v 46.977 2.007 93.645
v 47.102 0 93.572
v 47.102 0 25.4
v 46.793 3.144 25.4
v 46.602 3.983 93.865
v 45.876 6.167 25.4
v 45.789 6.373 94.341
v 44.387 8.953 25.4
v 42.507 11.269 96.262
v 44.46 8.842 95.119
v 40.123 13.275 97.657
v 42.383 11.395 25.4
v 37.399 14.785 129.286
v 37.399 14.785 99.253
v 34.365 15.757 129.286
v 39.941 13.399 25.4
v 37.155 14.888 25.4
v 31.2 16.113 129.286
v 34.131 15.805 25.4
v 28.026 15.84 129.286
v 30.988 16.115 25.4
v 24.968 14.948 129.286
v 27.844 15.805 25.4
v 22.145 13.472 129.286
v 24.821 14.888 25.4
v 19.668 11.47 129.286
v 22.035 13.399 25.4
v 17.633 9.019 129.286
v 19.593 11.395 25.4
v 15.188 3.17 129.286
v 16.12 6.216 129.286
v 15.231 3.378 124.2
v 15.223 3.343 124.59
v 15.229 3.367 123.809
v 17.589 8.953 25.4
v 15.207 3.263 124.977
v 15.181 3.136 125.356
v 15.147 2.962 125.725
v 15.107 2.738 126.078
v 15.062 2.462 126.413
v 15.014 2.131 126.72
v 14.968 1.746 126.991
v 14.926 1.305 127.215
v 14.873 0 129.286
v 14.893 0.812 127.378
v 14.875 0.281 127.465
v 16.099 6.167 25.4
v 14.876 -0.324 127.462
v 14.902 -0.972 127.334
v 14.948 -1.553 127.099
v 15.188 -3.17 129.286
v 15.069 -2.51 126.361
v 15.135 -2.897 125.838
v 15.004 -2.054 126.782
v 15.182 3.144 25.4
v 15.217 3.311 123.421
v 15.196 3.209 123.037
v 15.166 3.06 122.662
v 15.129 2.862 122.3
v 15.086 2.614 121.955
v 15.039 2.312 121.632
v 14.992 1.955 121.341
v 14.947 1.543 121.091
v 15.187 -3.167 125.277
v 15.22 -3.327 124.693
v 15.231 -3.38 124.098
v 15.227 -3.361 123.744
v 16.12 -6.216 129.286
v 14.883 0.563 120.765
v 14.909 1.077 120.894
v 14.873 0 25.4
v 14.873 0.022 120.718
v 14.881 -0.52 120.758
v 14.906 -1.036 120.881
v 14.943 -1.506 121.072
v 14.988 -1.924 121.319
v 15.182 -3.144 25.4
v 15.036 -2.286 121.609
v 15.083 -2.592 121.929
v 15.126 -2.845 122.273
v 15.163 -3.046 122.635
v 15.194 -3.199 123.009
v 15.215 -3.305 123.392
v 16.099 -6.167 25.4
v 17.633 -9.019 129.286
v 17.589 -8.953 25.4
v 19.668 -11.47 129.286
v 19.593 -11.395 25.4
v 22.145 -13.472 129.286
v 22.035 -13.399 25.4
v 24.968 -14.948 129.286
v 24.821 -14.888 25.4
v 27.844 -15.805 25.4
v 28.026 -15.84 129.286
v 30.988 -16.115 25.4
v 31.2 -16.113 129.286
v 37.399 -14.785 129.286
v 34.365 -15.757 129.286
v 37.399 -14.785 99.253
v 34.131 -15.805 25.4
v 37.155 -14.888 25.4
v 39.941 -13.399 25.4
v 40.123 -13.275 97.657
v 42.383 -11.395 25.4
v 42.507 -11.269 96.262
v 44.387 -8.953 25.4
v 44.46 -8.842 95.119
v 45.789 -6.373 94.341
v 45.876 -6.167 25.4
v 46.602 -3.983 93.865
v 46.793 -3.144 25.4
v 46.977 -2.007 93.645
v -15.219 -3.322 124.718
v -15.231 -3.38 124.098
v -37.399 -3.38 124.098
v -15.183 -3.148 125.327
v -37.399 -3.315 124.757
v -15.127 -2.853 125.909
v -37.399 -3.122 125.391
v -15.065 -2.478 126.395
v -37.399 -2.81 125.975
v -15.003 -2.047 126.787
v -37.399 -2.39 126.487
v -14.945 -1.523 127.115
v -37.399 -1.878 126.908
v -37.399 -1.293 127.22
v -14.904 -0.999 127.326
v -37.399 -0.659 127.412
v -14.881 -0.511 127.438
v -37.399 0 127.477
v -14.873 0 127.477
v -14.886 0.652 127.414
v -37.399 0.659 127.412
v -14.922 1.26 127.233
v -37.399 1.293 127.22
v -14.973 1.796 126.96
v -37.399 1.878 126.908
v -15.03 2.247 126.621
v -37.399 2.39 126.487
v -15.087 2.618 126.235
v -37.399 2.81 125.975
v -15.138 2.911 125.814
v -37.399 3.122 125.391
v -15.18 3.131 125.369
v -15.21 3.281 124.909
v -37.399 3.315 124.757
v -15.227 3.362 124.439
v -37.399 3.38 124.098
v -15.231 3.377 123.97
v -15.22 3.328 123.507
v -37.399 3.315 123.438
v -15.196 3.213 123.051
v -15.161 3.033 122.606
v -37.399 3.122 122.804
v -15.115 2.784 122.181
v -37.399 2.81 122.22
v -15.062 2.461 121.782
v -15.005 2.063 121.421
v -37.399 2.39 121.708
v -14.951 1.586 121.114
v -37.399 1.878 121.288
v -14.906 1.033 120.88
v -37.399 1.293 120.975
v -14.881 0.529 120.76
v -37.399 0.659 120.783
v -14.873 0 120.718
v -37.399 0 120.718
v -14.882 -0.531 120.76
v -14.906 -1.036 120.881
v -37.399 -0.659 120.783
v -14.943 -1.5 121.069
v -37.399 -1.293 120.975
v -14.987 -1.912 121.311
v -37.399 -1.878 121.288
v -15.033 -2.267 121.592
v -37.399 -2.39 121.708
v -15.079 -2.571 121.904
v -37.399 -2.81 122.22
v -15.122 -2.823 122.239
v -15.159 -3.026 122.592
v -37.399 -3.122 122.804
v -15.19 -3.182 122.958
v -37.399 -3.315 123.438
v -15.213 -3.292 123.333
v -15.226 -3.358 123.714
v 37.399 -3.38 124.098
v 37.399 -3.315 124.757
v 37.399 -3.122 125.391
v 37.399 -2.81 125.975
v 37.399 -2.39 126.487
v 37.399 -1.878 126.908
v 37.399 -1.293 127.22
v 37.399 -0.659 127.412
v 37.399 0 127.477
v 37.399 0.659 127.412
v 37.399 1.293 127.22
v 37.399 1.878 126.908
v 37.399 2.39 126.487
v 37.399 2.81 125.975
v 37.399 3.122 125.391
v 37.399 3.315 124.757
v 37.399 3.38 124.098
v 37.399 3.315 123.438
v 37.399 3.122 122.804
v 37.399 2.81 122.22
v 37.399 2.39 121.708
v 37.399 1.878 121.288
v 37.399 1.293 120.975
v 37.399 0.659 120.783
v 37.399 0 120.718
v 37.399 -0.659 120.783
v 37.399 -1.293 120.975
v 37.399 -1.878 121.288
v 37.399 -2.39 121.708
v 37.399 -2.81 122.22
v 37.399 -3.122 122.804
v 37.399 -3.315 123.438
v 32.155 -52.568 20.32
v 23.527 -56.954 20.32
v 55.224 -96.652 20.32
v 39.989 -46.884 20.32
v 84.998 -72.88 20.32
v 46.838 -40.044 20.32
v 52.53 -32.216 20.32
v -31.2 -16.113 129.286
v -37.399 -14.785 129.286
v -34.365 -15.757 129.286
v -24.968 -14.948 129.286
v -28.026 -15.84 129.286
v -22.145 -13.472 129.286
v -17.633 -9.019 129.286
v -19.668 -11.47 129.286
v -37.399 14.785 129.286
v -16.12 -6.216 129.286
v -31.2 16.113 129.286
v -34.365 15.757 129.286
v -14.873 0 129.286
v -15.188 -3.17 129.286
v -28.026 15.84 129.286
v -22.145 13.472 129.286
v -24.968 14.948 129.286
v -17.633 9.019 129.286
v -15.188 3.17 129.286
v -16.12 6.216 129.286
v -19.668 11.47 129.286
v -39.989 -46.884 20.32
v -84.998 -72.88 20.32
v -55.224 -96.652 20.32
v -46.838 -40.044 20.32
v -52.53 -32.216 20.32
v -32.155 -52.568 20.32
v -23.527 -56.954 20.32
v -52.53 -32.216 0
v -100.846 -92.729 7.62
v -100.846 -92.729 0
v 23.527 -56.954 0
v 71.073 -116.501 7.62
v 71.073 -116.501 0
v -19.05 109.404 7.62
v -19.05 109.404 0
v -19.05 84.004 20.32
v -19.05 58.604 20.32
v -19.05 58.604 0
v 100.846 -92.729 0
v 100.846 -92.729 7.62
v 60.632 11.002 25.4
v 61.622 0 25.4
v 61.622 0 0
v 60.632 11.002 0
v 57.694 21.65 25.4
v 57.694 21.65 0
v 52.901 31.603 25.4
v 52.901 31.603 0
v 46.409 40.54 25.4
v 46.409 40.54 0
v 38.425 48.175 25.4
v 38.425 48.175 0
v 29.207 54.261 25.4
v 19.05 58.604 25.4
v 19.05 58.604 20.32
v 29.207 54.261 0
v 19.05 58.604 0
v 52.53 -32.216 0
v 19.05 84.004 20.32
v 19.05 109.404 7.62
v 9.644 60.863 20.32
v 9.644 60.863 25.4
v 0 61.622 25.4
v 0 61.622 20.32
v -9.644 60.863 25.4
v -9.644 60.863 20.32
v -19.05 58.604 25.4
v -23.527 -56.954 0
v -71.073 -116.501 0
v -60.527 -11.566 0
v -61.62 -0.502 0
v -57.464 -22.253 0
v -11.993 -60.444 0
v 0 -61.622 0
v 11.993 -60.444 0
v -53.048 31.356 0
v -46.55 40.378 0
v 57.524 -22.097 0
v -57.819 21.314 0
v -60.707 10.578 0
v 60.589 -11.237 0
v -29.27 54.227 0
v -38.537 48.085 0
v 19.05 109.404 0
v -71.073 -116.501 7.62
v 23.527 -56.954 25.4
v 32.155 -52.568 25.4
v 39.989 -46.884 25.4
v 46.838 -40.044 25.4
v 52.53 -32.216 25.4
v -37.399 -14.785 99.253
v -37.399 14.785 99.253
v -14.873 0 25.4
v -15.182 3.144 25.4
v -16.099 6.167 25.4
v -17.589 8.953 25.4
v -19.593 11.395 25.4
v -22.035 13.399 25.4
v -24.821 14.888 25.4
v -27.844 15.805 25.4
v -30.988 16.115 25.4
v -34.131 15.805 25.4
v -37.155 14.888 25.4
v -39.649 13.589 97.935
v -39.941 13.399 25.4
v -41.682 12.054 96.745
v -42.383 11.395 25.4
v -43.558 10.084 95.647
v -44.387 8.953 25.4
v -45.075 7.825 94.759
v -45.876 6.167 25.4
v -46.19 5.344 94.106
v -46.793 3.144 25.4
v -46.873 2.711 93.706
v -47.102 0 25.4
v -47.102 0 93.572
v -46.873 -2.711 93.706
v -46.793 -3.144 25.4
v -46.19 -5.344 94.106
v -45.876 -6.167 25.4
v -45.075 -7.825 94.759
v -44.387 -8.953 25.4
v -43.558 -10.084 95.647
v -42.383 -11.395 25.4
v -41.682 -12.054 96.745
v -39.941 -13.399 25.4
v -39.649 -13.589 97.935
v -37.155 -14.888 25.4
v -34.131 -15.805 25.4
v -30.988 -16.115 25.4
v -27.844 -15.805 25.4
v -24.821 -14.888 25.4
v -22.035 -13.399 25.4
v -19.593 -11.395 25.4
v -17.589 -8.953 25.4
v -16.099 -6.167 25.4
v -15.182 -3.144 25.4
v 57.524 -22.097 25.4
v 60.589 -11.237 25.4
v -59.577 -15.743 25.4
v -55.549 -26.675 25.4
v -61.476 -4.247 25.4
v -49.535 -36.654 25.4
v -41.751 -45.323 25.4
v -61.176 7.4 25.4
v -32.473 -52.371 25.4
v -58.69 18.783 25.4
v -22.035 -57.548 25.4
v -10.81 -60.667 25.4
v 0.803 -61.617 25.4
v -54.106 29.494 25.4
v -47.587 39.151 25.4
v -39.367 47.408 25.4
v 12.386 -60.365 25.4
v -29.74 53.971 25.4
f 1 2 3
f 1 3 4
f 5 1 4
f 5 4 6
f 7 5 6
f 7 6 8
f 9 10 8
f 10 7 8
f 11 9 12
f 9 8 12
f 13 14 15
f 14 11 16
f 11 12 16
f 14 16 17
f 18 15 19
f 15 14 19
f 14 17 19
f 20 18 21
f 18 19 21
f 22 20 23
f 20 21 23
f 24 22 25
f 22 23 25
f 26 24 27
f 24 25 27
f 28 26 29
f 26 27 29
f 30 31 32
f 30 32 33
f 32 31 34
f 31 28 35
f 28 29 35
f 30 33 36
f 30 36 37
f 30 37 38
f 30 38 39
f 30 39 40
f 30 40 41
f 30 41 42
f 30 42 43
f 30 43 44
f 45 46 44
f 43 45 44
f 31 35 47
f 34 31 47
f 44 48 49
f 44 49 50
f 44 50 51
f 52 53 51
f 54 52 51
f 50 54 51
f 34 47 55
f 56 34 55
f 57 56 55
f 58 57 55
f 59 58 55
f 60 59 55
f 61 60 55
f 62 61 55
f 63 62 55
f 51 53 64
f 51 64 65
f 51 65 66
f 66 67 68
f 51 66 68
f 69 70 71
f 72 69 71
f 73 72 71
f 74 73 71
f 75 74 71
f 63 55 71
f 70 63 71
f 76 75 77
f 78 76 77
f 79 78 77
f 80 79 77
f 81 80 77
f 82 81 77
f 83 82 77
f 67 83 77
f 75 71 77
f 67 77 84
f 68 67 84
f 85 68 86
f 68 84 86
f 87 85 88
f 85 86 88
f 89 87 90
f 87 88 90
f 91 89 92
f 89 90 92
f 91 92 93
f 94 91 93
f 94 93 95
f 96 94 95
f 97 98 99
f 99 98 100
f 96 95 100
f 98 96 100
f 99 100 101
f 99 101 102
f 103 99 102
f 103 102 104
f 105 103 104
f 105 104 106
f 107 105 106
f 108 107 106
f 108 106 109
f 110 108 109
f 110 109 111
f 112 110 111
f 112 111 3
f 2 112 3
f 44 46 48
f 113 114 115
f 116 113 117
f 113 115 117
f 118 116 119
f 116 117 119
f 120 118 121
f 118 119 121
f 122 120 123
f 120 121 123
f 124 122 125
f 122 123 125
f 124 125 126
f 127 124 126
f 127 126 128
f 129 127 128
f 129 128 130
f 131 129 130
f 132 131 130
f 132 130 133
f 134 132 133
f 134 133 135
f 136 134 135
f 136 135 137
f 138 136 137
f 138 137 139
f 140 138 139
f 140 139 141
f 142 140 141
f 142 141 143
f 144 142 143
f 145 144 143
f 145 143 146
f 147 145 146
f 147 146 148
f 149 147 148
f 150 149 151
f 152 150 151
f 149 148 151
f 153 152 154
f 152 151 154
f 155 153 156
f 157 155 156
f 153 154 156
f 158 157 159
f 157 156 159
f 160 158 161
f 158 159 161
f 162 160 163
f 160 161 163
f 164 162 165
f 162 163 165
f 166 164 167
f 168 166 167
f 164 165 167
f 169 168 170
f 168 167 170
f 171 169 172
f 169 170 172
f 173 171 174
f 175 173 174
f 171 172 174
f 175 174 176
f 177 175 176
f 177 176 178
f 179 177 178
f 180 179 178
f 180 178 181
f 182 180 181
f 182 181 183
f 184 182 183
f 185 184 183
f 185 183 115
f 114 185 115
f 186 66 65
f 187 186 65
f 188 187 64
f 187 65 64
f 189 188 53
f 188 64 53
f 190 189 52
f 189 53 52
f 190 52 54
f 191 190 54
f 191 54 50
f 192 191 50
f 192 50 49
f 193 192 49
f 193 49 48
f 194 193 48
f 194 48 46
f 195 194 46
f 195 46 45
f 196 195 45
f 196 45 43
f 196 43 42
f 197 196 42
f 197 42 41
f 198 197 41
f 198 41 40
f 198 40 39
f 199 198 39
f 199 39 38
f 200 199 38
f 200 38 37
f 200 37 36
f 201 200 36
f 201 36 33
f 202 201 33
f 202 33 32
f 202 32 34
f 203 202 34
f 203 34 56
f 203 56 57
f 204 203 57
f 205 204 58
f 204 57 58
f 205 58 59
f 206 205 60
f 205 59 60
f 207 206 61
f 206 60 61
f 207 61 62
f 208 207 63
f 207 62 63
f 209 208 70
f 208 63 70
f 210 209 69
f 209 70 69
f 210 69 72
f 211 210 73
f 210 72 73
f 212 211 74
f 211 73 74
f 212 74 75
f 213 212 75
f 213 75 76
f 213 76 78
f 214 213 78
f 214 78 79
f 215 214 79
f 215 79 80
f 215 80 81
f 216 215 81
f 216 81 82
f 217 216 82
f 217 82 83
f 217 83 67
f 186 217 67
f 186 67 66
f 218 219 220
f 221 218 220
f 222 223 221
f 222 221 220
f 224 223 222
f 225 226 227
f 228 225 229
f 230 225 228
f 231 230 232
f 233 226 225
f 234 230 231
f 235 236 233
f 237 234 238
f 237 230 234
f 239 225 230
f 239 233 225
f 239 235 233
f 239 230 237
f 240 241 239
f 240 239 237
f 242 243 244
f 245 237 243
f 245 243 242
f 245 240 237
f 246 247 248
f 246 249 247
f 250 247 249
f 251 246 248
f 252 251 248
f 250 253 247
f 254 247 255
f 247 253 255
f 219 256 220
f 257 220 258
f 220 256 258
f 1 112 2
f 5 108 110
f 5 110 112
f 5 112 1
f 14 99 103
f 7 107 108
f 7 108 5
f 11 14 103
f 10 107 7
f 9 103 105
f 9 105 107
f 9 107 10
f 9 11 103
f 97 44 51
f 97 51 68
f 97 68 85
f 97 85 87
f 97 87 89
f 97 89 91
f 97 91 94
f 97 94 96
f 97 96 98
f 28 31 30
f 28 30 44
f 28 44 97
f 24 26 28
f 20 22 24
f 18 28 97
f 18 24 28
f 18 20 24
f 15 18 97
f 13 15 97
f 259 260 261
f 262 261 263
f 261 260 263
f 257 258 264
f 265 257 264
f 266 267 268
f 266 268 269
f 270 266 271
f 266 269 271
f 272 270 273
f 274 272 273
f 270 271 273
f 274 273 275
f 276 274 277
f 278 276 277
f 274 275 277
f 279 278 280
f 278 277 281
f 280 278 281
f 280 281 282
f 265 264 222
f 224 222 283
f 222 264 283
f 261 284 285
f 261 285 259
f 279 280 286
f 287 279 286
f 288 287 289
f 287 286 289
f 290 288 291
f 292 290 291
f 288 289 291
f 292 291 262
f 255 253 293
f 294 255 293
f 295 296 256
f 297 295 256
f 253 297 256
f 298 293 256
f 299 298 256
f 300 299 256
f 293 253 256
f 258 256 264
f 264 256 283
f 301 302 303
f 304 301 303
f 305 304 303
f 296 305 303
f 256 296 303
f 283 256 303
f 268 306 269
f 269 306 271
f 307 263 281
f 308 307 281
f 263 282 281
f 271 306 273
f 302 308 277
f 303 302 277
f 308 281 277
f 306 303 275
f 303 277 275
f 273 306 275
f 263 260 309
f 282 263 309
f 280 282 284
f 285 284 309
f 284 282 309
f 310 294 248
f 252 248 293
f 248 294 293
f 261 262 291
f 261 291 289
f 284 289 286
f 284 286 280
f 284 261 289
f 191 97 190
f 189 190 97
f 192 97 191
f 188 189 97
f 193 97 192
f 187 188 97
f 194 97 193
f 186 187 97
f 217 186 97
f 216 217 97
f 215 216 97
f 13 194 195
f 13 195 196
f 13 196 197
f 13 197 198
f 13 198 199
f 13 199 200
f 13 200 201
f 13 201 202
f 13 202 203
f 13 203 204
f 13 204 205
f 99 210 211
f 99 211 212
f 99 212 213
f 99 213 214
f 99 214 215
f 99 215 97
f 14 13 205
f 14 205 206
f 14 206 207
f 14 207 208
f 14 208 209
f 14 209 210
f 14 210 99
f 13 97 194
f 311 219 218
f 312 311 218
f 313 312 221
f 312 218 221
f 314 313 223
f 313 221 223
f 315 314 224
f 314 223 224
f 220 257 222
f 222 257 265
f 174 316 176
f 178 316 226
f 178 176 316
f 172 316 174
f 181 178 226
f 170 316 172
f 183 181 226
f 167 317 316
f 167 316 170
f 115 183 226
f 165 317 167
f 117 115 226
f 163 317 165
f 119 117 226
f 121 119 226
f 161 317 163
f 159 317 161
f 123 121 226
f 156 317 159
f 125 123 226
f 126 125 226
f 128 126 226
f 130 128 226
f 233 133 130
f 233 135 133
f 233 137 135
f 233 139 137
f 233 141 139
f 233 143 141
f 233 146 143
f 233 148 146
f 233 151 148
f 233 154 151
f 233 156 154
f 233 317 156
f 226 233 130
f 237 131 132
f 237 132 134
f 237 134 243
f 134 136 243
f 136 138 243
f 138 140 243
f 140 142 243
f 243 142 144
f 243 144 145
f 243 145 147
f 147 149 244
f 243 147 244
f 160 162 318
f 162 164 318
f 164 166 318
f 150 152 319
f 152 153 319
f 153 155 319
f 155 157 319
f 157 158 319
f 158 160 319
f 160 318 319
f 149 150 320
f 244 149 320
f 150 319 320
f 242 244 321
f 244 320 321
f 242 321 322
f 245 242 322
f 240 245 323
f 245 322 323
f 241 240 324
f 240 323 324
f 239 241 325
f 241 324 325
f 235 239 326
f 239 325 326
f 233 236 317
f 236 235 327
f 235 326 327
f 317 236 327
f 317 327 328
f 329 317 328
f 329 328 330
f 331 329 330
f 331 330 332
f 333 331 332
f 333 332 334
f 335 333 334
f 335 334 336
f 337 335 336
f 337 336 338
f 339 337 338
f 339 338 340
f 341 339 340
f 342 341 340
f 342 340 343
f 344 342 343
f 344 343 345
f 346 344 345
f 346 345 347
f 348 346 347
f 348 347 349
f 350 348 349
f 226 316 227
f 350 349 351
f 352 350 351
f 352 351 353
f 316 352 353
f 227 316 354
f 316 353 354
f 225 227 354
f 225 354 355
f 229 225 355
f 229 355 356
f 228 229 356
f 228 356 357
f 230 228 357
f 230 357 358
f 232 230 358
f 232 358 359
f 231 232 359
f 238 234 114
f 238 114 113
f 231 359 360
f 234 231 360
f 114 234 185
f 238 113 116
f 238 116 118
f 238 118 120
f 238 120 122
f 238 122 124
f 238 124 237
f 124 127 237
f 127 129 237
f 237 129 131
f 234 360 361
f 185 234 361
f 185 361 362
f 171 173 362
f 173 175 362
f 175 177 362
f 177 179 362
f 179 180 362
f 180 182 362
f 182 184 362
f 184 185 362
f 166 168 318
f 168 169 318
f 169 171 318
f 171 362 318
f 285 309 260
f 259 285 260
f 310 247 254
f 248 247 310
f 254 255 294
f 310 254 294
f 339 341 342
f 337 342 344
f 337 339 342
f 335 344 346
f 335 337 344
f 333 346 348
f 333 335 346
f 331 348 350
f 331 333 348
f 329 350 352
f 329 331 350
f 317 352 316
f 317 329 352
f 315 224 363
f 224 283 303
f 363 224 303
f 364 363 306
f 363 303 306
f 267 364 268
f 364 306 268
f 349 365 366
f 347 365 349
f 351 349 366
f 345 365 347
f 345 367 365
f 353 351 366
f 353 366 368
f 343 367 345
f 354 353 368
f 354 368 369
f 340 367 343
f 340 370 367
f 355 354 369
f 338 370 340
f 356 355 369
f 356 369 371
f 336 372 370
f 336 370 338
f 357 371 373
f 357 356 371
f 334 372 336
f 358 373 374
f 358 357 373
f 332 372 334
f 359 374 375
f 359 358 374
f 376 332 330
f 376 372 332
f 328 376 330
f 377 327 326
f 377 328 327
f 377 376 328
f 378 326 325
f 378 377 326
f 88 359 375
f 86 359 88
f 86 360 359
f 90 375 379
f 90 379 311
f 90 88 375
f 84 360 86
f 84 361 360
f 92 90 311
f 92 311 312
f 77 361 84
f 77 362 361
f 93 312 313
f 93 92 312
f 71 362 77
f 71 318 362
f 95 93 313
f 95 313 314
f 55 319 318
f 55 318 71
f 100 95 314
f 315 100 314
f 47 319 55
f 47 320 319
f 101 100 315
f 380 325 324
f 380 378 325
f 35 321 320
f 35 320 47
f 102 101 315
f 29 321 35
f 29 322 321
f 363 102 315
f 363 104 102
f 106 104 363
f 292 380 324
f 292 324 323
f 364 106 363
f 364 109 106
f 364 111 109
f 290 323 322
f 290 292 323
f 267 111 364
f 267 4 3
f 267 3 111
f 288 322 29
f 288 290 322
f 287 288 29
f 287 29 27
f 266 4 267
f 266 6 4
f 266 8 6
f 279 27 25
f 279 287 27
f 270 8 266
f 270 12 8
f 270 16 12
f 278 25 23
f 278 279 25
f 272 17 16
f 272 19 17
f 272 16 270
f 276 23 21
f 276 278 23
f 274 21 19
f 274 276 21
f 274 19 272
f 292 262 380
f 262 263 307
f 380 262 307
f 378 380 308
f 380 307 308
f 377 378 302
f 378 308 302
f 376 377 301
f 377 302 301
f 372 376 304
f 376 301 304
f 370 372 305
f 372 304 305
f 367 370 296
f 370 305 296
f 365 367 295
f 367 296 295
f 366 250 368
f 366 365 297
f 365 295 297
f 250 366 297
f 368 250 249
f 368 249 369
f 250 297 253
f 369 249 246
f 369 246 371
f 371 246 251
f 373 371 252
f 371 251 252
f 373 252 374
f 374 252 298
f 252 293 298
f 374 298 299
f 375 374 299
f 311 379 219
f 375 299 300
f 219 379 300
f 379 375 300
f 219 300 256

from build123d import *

# Parameters (mm, degrees)
F1_DEPTH      = 25.4
F2_DEPTH      = 20.32
F3_SIZE2      = 12.7
F3_SIZE       = 25.4
F4_SIZE2      = 25.4
F4_SIZE       = 12.7
F4_2_SIZE2    = 25.4
F4_2_SIZE     = 12.7
F5_R          = 16.1148296274
F6_DEPTH      = 103.886
F8_DEPTH      = 109.4047297446
F8_DEPTH_BACK = 116.5023496438
F9_R          = 3.3795298113
F10_DEPTH     = 138.2457237613


with BuildPart() as f1:
    # F0 (on Top) → F1 (new body)
    with BuildSketch(Plane.XY):
        with BuildLine():
            ThreePointArc((52.5300336642, -32.2163809765), (59.3056389857, -16.7374079377), (61.6222333252, 0))
            ThreePointArc((61.6222333252, 0), (49.8558080108, 36.2173721792), (19.05, 58.6037297446))
            ThreePointArc((19.05, 58.6037297446), (0, 61.6222333252), (-19.05, 58.6037297446))
            ThreePointArc((-19.05, 58.6037297446), (-57.8186685482, 21.31434276), (-52.5300336642, -32.2163809765))
            ThreePointArc((-52.5300336642, -32.2163809765), (-39.9894732611, -46.8843435305), (-23.5270019404, -56.9541905366))
            ThreePointArc((-23.5270019404, -56.9541905366), (0, -61.6222333252), (23.5270019404, -56.9541905366))
            ThreePointArc((23.5270019404, -56.9541905366), (39.9894732611, -46.8843435305), (52.5300336642, -32.2163809765))
        make_face()
    extrude(amount=F1_DEPTH)

    # F0 (on Top) → F2 (join)
    with BuildSketch(Plane.XY):
        with BuildLine():
            ThreePointArc((-23.5270019404, -56.9541905366), (-39.9894732611, -46.8843435305), (-52.5300336642, -32.2163809765))
            Line((-52.5300336642, -32.2163809765), (-100.8460948708, -92.7285929554))
            Line((-100.8460948708, -92.7285929554), (-71.0725153171, -116.5013496438))
            Line((-71.0725153171, -116.5013496438), (-23.5270019404, -56.9541905366))
        make_face()
        with BuildLine():
            ThreePointArc((-19.05, 58.6037297446), (0, 61.6222333252), (19.05, 58.6037297446))
            Line((19.05, 58.6037297446), (19.05, 109.4037297446))
            Line((19.05, 109.4037297446), (-19.05, 109.4037297446))
            Line((-19.05, 109.4037297446), (-19.05, 58.6037297446))
        make_face()
        with BuildLine():
            Line((100.8460948708, -92.7285929554), (52.5300336642, -32.2163809765))
            ThreePointArc((52.5300336642, -32.2163809765), (39.9894732611, -46.8843435305), (23.5270019404, -56.9541905366))
            Line((23.5270019404, -56.9541905366), (71.0725153171, -116.5013496438))
            Line((71.0725153171, -116.5013496438), (100.8460948708, -92.7285929554))
        make_face()
    extrude(amount=F2_DEPTH)

    # F3
    f3_edges = [f1.edges().sort_by_distance(p)[0] for p in [
        (85.959305, -104.614971, 20.32),
    ]]
    f3_side = f1.faces().sort_by_distance((62.662137, -75.354715, 20.32))[0]
    chamfer(f3_edges, length=F3_SIZE, length2=F3_SIZE2, reference=f3_side)

    # F4
    f4_edges = [f1.edges().sort_by_distance(p)[0] for p in [
        (-85.959305, -104.614971, 20.32),
    ]]
    f4_side = f1.faces().sort_by_distance((-85.959305, -104.614971, 10.16))[0]
    chamfer(f4_edges, length=F4_SIZE, length2=F4_SIZE2, reference=f4_side)

    # F4#2
    f4_2_edges = [f1.edges().sort_by_distance(p)[0] for p in [
        (0, 109.40373, 20.32),
    ]]
    f4_2_side = f1.faces().sort_by_distance((0, 109.40373, 10.16))[0]
    chamfer(f4_2_edges, length=F4_2_SIZE, length2=F4_2_SIZE2, reference=f4_2_side)

    # F5 (on face) → F6 (join)
    with BuildSketch(Plane.XY.offset(25.4)):
        with Locations((-30.9876389802, 0)):
            Circle(F5_R)
        with Locations((30.9876389802, 0)):
            Circle(F5_R)
    extrude(amount=F6_DEPTH)

    # F7 (on Front) → F8 (cut, two sides)
    with BuildSketch(Plane.XZ) as f8_sk:
        Polygon((47.1024686075, 129.286), (37.3986288905, 129.286), (37.3986288905, 99.2526204783), (47.1024686075, 93.5718588345), align=None)
        Polygon((-47.1024686075, 129.286), (-47.1024686075, 93.5718588345), (-37.3986288905, 99.2526204783), (-37.3986288905, 129.286), align=None)
    extrude(amount=-F8_DEPTH, mode=Mode.SUBTRACT)
    extrude(f8_sk.sketch, amount=F8_DEPTH_BACK, mode=Mode.SUBTRACT)

    # F9 (on face) → F10 (cut, through all)
    with BuildSketch(Plane(origin=(-37.3986288905, 0, 0), x_dir=(0, -1, 0), z_dir=(-1, 0, 0))):
        with Locations((0, 124.0975558758)):
            Circle(F9_R)
    extrude(amount=-F10_DEPTH, mode=Mode.SUBTRACT)


solid = f1.part
